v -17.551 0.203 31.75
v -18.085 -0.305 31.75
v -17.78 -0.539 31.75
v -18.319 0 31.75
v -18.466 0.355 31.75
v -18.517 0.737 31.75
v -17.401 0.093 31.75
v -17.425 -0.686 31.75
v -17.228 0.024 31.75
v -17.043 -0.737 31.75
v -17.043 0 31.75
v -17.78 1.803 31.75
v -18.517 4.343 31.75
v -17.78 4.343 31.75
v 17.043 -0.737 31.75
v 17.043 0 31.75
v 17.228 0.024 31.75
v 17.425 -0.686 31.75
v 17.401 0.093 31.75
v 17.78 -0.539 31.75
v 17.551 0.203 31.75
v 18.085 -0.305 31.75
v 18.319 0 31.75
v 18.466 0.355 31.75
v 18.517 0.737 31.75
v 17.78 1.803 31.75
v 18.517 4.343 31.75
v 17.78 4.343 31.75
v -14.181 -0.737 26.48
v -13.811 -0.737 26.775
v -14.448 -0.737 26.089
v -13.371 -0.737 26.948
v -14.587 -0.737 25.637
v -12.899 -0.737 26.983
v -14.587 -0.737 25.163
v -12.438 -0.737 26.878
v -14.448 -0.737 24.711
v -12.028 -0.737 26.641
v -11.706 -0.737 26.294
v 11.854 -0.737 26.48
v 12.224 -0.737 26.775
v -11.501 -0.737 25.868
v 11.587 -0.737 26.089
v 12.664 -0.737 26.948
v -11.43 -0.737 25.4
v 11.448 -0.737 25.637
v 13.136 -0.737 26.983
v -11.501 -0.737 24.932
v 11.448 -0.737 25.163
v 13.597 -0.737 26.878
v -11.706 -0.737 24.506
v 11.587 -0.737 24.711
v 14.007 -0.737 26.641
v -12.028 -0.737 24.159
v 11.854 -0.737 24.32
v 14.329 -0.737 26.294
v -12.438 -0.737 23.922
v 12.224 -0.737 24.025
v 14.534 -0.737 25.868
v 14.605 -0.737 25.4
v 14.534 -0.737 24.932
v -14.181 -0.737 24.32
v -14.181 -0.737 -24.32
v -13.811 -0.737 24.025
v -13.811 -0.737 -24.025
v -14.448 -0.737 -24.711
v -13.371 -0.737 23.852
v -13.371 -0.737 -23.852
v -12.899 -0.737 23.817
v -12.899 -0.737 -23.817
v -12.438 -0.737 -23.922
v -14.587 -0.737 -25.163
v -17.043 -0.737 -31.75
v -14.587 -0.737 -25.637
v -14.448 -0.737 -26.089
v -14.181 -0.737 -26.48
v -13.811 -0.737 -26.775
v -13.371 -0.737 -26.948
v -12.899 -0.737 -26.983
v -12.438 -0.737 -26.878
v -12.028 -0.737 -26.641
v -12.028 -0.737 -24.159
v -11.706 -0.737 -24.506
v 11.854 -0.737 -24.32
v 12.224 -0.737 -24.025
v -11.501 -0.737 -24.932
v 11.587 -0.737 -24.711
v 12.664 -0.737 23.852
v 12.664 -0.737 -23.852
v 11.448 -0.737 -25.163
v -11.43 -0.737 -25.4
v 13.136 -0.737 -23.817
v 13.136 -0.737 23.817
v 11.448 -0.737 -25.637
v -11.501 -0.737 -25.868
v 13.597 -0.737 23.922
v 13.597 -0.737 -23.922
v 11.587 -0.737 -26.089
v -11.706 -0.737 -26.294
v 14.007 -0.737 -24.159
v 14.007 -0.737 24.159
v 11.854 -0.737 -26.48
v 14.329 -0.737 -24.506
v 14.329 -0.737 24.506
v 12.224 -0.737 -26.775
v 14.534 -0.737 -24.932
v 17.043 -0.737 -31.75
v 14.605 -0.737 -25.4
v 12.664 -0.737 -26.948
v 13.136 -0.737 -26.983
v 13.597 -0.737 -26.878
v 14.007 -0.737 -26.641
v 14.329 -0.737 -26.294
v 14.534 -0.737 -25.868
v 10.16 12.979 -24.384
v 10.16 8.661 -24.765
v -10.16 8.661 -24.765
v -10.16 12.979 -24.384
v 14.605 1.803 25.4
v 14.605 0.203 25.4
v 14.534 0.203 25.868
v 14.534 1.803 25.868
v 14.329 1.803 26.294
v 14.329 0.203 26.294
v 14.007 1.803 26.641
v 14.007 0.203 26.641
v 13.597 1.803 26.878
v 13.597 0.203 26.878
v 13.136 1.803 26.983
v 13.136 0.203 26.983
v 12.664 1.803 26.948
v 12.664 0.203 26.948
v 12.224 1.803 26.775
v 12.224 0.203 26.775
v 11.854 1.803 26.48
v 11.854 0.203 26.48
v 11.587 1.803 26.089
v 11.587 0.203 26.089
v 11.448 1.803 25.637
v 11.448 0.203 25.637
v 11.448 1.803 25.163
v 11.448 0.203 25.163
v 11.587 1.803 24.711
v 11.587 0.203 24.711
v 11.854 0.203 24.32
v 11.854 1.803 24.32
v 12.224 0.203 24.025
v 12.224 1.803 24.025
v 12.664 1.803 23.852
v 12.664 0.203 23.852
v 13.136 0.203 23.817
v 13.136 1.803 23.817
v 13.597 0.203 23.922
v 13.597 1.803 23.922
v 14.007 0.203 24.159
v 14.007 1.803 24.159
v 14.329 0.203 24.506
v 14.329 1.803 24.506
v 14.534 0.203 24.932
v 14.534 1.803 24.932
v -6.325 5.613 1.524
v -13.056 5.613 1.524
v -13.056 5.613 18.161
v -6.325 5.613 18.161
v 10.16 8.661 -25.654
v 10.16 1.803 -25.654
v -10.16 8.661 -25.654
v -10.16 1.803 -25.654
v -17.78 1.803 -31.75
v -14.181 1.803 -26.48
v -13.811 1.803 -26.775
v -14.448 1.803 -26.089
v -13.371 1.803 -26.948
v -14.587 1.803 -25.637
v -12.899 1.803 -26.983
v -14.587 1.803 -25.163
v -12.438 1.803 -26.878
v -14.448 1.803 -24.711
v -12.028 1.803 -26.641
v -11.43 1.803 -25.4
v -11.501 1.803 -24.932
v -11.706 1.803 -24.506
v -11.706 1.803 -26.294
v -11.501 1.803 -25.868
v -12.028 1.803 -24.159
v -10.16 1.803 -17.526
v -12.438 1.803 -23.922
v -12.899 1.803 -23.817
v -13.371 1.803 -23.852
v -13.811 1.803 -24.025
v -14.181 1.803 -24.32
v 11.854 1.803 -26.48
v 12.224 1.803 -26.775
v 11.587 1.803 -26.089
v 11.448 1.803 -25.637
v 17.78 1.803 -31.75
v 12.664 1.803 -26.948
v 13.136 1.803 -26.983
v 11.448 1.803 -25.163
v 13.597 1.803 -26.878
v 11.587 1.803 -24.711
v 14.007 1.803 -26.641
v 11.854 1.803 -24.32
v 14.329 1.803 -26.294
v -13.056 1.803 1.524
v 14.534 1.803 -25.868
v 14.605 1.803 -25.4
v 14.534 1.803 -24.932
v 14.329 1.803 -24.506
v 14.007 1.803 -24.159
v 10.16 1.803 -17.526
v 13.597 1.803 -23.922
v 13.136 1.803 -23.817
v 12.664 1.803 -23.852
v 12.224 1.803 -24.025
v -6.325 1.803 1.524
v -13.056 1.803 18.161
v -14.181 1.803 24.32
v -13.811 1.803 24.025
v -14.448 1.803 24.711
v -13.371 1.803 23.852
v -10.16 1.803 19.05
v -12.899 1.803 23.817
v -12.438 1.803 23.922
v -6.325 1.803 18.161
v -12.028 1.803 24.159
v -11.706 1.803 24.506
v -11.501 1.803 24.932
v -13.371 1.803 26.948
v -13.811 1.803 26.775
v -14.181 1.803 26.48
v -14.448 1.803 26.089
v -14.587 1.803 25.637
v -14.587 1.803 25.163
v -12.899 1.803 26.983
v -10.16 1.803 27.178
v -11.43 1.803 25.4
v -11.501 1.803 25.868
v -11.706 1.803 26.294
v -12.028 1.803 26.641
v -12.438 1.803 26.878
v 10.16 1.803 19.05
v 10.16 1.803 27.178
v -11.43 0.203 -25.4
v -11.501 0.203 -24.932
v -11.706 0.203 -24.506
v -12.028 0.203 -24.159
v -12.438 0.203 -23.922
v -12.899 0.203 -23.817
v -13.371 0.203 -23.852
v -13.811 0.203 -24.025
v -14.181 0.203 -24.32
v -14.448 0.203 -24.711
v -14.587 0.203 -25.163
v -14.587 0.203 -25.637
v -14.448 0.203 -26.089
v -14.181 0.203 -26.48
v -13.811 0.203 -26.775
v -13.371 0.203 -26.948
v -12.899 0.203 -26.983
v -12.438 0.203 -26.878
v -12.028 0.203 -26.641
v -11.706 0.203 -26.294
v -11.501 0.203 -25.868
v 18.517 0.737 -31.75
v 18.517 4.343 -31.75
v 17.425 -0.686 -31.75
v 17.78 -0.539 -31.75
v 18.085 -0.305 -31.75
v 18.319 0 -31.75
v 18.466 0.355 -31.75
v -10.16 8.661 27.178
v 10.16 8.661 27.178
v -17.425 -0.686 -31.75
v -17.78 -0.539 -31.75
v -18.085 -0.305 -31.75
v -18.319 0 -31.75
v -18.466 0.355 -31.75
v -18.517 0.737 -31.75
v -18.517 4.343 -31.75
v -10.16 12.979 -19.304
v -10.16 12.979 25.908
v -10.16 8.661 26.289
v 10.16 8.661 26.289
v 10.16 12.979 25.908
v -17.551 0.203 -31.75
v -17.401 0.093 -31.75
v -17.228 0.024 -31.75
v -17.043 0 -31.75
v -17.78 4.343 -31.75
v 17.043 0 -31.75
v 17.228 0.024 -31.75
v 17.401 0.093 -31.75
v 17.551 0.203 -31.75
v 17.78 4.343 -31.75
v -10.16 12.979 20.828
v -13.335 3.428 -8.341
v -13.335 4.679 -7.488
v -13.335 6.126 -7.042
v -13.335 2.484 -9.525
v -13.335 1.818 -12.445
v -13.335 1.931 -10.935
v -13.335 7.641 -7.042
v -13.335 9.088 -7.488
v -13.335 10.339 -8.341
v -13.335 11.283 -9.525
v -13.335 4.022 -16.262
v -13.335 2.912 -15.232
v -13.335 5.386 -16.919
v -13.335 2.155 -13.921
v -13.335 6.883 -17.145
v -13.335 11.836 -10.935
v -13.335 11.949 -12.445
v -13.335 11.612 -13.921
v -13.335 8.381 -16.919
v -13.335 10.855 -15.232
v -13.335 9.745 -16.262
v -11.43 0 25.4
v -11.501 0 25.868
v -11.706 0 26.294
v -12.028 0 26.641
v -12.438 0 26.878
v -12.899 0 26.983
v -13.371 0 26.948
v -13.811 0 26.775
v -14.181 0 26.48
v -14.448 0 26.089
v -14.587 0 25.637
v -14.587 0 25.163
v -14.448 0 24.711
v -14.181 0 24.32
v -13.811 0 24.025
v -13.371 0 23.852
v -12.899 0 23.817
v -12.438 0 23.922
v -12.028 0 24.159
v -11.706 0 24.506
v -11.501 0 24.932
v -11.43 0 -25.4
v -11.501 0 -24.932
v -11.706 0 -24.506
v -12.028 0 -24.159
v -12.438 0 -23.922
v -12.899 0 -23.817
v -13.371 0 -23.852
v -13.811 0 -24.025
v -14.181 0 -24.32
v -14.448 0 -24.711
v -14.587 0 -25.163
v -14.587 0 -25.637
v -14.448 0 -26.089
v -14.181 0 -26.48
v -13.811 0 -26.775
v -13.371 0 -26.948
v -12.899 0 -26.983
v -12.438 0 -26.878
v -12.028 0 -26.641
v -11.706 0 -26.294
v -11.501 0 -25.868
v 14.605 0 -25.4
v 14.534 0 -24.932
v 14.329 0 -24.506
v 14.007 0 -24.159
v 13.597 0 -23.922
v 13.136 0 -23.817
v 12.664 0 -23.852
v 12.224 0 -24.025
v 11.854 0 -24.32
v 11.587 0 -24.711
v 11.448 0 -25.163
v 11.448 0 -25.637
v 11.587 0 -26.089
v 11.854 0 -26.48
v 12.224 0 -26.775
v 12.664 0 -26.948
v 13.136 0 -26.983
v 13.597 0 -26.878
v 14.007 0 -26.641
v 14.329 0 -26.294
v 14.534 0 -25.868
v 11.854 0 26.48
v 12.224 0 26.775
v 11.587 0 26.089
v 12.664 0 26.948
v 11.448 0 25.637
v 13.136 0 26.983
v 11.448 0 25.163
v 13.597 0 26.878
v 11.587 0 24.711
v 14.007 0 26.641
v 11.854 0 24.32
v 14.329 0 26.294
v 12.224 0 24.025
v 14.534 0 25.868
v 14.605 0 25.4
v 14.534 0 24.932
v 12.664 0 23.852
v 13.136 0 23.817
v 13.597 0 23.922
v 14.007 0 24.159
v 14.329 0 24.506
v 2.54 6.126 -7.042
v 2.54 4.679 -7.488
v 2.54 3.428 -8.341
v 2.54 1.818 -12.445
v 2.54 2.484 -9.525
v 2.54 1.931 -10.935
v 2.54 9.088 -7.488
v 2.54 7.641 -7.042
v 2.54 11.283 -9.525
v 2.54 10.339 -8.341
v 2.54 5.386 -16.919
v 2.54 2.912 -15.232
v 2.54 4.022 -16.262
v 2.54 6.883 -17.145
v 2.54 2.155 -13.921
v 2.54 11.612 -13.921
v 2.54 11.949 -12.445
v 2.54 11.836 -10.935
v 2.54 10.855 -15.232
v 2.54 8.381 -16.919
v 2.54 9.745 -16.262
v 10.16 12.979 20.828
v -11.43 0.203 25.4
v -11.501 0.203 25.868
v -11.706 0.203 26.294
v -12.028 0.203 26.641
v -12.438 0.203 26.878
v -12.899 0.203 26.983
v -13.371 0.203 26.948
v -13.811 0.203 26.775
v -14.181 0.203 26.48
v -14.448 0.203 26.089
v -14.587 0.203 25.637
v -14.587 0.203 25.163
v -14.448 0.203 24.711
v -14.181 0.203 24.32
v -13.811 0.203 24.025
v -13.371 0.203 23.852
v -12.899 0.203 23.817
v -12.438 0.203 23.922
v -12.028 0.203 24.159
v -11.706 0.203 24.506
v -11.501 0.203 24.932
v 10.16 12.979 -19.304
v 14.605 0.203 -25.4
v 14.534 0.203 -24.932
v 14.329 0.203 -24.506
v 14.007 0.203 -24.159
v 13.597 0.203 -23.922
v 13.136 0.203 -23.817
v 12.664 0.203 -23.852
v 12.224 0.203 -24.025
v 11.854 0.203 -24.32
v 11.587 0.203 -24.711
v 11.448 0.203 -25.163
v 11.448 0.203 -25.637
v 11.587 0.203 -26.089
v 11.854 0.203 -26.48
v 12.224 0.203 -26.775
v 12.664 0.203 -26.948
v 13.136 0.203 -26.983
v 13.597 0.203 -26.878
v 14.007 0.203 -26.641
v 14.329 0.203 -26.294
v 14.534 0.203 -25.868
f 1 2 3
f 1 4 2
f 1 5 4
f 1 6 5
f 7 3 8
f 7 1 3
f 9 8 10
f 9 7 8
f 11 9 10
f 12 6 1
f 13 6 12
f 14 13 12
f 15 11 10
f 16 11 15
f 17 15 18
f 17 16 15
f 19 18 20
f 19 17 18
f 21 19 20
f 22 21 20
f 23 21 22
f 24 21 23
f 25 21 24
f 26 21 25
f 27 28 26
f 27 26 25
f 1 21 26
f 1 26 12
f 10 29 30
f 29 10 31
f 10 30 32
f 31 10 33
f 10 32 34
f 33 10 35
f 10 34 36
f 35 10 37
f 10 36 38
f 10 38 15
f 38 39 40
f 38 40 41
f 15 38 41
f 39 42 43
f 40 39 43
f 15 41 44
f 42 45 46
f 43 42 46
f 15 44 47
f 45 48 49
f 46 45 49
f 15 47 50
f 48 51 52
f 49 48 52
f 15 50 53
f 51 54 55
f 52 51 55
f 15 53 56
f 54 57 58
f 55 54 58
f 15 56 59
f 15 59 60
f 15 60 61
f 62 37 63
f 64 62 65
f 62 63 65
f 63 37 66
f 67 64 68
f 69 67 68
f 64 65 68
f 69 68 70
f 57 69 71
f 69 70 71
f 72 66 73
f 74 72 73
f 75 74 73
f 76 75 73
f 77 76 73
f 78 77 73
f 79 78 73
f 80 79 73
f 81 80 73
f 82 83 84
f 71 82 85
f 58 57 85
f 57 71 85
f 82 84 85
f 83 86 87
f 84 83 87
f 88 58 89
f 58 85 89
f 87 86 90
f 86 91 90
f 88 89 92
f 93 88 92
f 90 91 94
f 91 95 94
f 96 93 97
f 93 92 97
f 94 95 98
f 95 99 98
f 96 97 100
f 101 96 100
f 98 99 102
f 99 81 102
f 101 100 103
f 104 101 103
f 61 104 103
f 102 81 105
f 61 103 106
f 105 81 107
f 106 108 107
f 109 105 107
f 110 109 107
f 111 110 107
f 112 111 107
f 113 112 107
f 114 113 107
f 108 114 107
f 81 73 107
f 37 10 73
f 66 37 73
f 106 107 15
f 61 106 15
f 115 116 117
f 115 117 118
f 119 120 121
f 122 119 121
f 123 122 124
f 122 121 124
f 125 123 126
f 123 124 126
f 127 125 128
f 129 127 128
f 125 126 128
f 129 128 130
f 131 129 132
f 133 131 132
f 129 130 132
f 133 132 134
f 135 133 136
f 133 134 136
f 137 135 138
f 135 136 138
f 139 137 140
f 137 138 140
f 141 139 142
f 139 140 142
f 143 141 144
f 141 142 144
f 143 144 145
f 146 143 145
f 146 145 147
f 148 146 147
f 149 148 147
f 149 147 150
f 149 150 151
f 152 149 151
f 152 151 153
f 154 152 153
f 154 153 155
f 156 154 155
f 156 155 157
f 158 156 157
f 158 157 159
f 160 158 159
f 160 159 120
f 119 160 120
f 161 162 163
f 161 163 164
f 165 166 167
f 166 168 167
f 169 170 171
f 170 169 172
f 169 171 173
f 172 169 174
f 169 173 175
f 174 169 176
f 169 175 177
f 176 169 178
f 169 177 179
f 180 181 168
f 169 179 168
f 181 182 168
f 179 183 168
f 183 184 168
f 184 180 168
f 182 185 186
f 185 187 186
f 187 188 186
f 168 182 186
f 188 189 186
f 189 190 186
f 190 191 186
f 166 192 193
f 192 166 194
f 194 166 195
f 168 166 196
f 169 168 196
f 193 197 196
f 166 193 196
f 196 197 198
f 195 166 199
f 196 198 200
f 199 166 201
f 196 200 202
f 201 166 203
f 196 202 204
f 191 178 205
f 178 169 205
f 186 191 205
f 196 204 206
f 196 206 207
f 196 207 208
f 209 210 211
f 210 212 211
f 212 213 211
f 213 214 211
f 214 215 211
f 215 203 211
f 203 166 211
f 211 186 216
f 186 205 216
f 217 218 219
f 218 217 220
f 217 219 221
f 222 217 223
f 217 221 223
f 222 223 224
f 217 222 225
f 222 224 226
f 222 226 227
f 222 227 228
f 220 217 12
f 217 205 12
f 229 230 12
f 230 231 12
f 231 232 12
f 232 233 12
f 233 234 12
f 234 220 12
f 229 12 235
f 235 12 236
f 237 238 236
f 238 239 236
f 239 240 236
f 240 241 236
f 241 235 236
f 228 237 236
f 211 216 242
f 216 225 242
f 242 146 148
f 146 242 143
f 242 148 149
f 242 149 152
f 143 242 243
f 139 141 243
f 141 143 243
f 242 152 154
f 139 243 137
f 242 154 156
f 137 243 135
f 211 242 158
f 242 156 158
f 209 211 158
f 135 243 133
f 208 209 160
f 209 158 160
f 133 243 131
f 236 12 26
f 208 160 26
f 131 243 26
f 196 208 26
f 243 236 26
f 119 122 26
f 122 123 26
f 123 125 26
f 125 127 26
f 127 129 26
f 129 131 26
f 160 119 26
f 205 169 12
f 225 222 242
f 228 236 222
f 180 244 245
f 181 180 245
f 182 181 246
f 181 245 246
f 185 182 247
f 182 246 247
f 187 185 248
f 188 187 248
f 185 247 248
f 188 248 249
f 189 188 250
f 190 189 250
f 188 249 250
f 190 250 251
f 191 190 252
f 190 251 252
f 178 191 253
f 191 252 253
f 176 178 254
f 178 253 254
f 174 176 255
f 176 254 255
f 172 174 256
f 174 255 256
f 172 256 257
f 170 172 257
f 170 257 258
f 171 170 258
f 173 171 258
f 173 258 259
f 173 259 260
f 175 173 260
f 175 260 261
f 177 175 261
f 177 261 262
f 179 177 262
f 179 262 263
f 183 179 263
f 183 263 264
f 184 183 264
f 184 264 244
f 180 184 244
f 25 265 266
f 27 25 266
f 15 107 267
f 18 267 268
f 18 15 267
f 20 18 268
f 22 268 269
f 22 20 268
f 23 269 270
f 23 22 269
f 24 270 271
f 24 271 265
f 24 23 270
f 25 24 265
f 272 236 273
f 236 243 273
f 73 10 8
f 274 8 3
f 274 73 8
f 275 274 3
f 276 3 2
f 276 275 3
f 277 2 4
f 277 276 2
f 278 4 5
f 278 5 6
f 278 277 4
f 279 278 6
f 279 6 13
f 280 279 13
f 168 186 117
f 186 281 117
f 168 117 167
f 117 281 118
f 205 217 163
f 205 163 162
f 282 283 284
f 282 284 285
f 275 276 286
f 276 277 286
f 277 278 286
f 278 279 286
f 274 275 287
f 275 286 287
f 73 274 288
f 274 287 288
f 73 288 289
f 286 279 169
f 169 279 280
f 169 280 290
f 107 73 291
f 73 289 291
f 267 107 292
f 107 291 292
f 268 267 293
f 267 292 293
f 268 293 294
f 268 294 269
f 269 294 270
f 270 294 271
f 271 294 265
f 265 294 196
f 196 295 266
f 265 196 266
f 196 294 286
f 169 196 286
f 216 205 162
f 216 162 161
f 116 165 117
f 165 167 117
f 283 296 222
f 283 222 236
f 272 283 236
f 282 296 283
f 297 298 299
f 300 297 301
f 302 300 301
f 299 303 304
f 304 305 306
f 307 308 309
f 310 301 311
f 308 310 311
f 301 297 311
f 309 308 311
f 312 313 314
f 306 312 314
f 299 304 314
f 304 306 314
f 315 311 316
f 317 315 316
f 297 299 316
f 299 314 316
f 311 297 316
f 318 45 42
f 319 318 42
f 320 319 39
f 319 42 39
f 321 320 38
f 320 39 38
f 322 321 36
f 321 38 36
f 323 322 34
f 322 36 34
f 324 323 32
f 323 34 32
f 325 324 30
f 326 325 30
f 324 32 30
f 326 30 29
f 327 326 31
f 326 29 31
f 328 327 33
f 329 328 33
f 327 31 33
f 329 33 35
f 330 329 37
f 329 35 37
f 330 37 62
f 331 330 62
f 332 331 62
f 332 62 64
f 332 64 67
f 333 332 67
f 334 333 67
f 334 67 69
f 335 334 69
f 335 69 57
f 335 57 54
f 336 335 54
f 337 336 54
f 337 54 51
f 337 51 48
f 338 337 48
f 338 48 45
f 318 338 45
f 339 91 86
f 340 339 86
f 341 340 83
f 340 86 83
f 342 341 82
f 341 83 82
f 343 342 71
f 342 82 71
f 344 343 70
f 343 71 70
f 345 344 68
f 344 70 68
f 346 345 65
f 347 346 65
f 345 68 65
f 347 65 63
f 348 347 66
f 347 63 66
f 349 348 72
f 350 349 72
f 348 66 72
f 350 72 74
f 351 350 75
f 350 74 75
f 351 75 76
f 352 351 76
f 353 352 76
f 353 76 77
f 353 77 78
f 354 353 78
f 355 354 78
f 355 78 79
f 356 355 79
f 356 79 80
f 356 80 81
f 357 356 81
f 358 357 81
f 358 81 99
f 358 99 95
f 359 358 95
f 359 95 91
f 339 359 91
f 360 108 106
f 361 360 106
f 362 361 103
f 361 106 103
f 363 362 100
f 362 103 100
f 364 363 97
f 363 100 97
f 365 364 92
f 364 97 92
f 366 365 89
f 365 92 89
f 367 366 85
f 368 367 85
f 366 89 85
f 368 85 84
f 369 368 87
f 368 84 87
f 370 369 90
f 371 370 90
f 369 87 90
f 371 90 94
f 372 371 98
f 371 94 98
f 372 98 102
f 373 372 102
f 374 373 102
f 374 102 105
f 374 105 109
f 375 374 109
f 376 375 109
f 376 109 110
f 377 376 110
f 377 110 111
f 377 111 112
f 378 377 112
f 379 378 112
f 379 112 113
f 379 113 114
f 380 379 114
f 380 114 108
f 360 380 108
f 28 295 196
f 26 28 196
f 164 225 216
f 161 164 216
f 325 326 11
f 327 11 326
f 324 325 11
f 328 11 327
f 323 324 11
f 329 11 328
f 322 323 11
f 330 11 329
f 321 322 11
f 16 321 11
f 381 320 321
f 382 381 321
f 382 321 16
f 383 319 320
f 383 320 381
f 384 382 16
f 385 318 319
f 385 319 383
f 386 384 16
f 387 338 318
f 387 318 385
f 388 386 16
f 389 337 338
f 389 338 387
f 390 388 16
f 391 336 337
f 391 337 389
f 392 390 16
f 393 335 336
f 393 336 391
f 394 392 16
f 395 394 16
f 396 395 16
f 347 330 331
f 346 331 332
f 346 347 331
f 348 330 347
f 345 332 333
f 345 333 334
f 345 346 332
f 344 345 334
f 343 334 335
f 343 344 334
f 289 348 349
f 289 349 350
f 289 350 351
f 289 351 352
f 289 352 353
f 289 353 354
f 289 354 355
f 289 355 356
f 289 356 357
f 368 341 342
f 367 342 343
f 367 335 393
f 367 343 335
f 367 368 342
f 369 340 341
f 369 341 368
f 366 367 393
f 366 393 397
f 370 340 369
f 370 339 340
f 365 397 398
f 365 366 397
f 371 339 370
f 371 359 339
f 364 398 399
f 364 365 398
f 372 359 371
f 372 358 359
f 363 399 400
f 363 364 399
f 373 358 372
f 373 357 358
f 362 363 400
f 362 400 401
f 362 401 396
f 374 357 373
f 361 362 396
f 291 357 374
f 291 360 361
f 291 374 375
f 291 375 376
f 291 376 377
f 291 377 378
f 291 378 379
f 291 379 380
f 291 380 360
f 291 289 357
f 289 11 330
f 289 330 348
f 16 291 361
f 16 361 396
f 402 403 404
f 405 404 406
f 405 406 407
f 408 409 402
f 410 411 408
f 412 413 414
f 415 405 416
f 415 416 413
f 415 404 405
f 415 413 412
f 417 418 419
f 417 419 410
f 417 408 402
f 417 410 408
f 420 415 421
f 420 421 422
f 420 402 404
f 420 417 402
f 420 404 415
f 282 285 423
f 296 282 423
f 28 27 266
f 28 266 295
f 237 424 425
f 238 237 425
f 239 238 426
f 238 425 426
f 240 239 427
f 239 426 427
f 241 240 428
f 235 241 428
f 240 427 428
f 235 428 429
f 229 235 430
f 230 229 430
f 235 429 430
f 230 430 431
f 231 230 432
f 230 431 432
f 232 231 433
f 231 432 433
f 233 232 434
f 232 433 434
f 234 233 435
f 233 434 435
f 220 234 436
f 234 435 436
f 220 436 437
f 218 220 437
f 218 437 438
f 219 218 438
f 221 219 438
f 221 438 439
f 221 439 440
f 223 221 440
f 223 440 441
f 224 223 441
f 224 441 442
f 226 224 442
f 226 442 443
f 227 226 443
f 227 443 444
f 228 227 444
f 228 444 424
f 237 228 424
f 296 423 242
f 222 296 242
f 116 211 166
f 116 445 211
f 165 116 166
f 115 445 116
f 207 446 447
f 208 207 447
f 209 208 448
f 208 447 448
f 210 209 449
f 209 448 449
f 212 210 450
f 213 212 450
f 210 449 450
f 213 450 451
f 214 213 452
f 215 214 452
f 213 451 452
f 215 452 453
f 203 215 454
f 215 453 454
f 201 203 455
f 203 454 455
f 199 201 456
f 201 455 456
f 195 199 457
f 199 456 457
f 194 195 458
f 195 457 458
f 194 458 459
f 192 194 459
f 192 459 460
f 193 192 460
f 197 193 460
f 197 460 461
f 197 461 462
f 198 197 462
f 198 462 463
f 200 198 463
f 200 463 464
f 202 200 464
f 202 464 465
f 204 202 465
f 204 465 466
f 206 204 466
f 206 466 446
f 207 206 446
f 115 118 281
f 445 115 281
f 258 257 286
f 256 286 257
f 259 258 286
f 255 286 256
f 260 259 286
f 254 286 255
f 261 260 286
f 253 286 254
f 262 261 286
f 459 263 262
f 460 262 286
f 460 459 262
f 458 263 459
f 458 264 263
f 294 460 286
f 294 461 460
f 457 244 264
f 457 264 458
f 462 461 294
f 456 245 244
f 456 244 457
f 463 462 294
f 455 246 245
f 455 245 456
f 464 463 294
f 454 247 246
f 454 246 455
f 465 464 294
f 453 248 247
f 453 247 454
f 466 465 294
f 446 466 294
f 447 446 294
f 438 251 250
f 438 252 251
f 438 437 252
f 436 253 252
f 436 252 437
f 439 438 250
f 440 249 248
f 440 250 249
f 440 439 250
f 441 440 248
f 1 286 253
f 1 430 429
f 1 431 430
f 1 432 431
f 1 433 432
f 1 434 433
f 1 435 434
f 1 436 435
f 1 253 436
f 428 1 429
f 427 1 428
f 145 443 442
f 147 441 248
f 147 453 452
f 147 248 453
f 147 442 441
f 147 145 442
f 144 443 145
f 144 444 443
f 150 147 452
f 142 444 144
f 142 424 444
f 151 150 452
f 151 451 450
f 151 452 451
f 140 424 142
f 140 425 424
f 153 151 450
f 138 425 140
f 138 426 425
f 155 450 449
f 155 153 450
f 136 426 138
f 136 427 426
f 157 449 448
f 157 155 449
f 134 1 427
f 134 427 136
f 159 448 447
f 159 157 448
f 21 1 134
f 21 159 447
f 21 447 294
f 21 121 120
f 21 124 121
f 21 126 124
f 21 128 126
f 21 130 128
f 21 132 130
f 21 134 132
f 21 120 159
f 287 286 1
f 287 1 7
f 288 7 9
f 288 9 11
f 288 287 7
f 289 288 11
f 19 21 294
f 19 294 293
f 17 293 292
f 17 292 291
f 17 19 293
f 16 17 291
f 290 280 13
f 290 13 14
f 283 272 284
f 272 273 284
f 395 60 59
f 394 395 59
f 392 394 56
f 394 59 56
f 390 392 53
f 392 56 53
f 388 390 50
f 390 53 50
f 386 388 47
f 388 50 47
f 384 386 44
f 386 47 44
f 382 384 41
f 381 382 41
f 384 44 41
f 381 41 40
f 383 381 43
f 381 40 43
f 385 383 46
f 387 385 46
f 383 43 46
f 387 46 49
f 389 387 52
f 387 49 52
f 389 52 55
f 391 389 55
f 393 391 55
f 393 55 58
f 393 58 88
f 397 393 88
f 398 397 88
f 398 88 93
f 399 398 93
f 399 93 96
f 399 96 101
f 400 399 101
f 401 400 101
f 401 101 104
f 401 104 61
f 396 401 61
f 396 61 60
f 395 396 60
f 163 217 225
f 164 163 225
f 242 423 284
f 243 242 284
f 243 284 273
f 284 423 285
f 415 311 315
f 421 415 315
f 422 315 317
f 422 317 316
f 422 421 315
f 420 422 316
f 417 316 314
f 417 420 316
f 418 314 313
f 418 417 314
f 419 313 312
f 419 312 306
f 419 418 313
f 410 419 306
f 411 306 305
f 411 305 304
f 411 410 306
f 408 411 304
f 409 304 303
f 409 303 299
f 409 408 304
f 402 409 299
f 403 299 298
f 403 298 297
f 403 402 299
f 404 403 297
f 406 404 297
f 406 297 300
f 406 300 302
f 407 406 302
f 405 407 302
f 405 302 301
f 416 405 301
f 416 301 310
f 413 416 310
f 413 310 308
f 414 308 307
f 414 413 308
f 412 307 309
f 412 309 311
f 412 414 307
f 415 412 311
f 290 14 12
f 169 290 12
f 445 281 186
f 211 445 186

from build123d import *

# Parameters (mm, degrees)
SKETCH1_W                      = 35.56
SKETCH1_H                      = 63.5
BASE_FLANGE1_DEPTH             = 0.7366
EDGE_FLANGE1_STRIP_W           = 4.4196
EDGE_FLANGE1_STRIP_H           = 0.7366
EDGE_FLANGE1_STRIP_CUT_DEPTH   = 63.5
EDGE_FLANGE1_STRIP_2_W         = 4.4196
EDGE_FLANGE1_STRIP_2_H         = 0.7366
EDGE_FLANGE1_STRIP_CUT_2_DEPTH = 63.5
EDGE_FLANGE1_DEPTH             = 63.5
EDGE_FLANGE1_BEND_DEPTH        = 63.5
SKETCH12_W                     = 35.56
SKETCH12_H                     = 1.6002
BOSS_EXTRUDE1_DEPTH            = 63.5
SKETCH13_R                     = 1.5875
CUT_EXTRUDE1_DEPTH             = 38.104357905
BOSS_EXTRUDE2_DEPTH            = 10.16
BOSS_EXTRUDE3_START            = 2.54
SKETCH15_R                     = 5.08
BOSS_EXTRUDE3_DEPTH            = 15.875
SKETCH16_W                     = 6.731
SKETCH16_H                     = 16.637
BOSS_EXTRUDE4_DEPTH            = 3.81


# Sheet-metal steps are written as plain solids
with BuildPart() as part:
    # Sketch1 → Base-Flange1 (new body)
    with BuildSketch(Plane(origin=(0, 0, 0), x_dir=(1, 0, 0), z_dir=(0, 1, 0))):
        Rectangle(SKETCH1_W, SKETCH1_H)
    extrude(amount=-BASE_FLANGE1_DEPTH)

    # Edge-Flange1 strip (across the edge) → Edge-Flange1 strip cut (cut)
    with BuildSketch(Plane(origin=(-17.78, 0, -31.75), x_dir=(1, 0, 0), z_dir=(0, 0, 1))):
        with Locations((-1.4732, -0.3683)):
            Rectangle(EDGE_FLANGE1_STRIP_W, EDGE_FLANGE1_STRIP_H)
    extrude(amount=EDGE_FLANGE1_STRIP_CUT_DEPTH, mode=Mode.SUBTRACT)

    # Edge-Flange1 strip 2 (across the edge) → Edge-Flange1 strip cut 2 (cut)
    with BuildSketch(Plane(origin=(17.78, 0, 31.75), x_dir=(-1, 0, 0), z_dir=(0, 0, -1))):
        with Locations((-1.4732, -0.3683)):
            Rectangle(EDGE_FLANGE1_STRIP_2_W, EDGE_FLANGE1_STRIP_2_H)
    extrude(amount=EDGE_FLANGE1_STRIP_CUT_2_DEPTH, mode=Mode.SUBTRACT)

    # Edge-Flange1 section (across the edge) → Edge-Flange1 (add)
    with BuildSketch(Plane(origin=(-17.78, 0, -31.75), x_dir=(1, 0, 0), z_dir=(0, 0, 1))):
        with BuildLine():
            Line((-0.7366, 0.7366), (-0.7366, 4.3434))
            Line((-0.7366, 4.3434), (0, 4.3434))
            Line((0, 4.3434), (0, 0.7366))
            ThreePointArc((0, 0.7366), (0.215745145, 0.215745145), (0.7366, 0))
            Line((0.7366, 0), (0.7366, -0.7366))
            ThreePointArc((0.7366, -0.7366), (-0.30510971, -0.30510971), (-0.7366, 0.7366))
        make_face()
    extrude(amount=EDGE_FLANGE1_DEPTH)

    # Edge-Flange1 section 2 (across the edge) → Edge-Flange1 bend (add)
    with BuildSketch(Plane(origin=(17.78, 0, 31.75), x_dir=(-1, 0, 0), z_dir=(0, 0, -1))):
        with BuildLine():
            Line((-0.7366, 0.7366), (-0.7366, 4.3434))
            Line((-0.7366, 4.3434), (0, 4.3434))
            Line((0, 4.3434), (0, 0.7366))
            ThreePointArc((0, 0.7366), (0.215745145, 0.215745145), (0.7366, 0))
            Line((0.7366, 0), (0.7366, -0.7366))
            ThreePointArc((0.7366, -0.7366), (-0.30510971, -0.30510971), (-0.7366, 0.7366))
        make_face()
    extrude(amount=EDGE_FLANGE1_BEND_DEPTH)

    # Sketch12 → Boss-Extrude1 (add, through all)
    with BuildSketch(Plane.XY.offset(31.75)):
        with Locations((0, 1.0033)):
            Rectangle(SKETCH12_W, SKETCH12_H)
    extrude(amount=-BOSS_EXTRUDE1_DEPTH)

    # Sketch13 → Cut-Extrude1 (cut, through all)
    with BuildSketch(Plane.XZ.offset(0.7366)):
        with Locations((-13.0175, 25.4)):
            Circle(SKETCH13_R)
        with Locations((13.0175, 25.4)):
            Circle(SKETCH13_R)
        with Locations((13.0175, -25.4)):
            Circle(SKETCH13_R)
        with Locations((-13.0175, -25.4)):
            Circle(SKETCH13_R)
    extrude(amount=-CUT_EXTRUDE1_DEPTH, mode=Mode.SUBTRACT)

    # Sketch14 → Boss-Extrude2 (add, symmetric)
    with BuildSketch(Plane(origin=(0, 0, 0), x_dir=(0, 0, -1), z_dir=(1, 0, 0))):
        Polygon((17.526, 1.8034), (25.654, 1.8034), (25.654, 8.6614), (24.765, 8.6614), (24.384, 12.9794), (19.304, 12.9794), align=None)
        Polygon((-20.828, 12.9794), (-19.05, 1.8034), (-27.178, 1.8034), (-27.178, 8.6614), (-26.289, 8.6614), (-25.908, 12.9794), align=None)
    extrude(amount=BOSS_EXTRUDE2_DEPTH, both=True)

    # Sketch16 → Boss-Extrude4 (add)
    with BuildSketch(Plane(origin=(0, 1.8034, 0), x_dir=(1, 0, 0), z_dir=(0, 1, 0))):
        with Locations((-9.6901, -9.8425)):
            Rectangle(SKETCH16_W, SKETCH16_H)
    extrude(amount=BOSS_EXTRUDE4_DEPTH)


with BuildPart() as body_2:
    # Sketch15 → Boss-Extrude3 (new body)
    with BuildSketch(Plane(origin=(0, 0, 0), x_dir=(0, 0, -1), z_dir=(1, 0, 0)).offset(BOSS_EXTRUDE3_START)):
        with Locations((12.065, 6.8834)):
            Circle(SKETCH15_R)
    extrude(amount=-BOSS_EXTRUDE3_DEPTH)


solid = Compound([part.part, body_2.part])
